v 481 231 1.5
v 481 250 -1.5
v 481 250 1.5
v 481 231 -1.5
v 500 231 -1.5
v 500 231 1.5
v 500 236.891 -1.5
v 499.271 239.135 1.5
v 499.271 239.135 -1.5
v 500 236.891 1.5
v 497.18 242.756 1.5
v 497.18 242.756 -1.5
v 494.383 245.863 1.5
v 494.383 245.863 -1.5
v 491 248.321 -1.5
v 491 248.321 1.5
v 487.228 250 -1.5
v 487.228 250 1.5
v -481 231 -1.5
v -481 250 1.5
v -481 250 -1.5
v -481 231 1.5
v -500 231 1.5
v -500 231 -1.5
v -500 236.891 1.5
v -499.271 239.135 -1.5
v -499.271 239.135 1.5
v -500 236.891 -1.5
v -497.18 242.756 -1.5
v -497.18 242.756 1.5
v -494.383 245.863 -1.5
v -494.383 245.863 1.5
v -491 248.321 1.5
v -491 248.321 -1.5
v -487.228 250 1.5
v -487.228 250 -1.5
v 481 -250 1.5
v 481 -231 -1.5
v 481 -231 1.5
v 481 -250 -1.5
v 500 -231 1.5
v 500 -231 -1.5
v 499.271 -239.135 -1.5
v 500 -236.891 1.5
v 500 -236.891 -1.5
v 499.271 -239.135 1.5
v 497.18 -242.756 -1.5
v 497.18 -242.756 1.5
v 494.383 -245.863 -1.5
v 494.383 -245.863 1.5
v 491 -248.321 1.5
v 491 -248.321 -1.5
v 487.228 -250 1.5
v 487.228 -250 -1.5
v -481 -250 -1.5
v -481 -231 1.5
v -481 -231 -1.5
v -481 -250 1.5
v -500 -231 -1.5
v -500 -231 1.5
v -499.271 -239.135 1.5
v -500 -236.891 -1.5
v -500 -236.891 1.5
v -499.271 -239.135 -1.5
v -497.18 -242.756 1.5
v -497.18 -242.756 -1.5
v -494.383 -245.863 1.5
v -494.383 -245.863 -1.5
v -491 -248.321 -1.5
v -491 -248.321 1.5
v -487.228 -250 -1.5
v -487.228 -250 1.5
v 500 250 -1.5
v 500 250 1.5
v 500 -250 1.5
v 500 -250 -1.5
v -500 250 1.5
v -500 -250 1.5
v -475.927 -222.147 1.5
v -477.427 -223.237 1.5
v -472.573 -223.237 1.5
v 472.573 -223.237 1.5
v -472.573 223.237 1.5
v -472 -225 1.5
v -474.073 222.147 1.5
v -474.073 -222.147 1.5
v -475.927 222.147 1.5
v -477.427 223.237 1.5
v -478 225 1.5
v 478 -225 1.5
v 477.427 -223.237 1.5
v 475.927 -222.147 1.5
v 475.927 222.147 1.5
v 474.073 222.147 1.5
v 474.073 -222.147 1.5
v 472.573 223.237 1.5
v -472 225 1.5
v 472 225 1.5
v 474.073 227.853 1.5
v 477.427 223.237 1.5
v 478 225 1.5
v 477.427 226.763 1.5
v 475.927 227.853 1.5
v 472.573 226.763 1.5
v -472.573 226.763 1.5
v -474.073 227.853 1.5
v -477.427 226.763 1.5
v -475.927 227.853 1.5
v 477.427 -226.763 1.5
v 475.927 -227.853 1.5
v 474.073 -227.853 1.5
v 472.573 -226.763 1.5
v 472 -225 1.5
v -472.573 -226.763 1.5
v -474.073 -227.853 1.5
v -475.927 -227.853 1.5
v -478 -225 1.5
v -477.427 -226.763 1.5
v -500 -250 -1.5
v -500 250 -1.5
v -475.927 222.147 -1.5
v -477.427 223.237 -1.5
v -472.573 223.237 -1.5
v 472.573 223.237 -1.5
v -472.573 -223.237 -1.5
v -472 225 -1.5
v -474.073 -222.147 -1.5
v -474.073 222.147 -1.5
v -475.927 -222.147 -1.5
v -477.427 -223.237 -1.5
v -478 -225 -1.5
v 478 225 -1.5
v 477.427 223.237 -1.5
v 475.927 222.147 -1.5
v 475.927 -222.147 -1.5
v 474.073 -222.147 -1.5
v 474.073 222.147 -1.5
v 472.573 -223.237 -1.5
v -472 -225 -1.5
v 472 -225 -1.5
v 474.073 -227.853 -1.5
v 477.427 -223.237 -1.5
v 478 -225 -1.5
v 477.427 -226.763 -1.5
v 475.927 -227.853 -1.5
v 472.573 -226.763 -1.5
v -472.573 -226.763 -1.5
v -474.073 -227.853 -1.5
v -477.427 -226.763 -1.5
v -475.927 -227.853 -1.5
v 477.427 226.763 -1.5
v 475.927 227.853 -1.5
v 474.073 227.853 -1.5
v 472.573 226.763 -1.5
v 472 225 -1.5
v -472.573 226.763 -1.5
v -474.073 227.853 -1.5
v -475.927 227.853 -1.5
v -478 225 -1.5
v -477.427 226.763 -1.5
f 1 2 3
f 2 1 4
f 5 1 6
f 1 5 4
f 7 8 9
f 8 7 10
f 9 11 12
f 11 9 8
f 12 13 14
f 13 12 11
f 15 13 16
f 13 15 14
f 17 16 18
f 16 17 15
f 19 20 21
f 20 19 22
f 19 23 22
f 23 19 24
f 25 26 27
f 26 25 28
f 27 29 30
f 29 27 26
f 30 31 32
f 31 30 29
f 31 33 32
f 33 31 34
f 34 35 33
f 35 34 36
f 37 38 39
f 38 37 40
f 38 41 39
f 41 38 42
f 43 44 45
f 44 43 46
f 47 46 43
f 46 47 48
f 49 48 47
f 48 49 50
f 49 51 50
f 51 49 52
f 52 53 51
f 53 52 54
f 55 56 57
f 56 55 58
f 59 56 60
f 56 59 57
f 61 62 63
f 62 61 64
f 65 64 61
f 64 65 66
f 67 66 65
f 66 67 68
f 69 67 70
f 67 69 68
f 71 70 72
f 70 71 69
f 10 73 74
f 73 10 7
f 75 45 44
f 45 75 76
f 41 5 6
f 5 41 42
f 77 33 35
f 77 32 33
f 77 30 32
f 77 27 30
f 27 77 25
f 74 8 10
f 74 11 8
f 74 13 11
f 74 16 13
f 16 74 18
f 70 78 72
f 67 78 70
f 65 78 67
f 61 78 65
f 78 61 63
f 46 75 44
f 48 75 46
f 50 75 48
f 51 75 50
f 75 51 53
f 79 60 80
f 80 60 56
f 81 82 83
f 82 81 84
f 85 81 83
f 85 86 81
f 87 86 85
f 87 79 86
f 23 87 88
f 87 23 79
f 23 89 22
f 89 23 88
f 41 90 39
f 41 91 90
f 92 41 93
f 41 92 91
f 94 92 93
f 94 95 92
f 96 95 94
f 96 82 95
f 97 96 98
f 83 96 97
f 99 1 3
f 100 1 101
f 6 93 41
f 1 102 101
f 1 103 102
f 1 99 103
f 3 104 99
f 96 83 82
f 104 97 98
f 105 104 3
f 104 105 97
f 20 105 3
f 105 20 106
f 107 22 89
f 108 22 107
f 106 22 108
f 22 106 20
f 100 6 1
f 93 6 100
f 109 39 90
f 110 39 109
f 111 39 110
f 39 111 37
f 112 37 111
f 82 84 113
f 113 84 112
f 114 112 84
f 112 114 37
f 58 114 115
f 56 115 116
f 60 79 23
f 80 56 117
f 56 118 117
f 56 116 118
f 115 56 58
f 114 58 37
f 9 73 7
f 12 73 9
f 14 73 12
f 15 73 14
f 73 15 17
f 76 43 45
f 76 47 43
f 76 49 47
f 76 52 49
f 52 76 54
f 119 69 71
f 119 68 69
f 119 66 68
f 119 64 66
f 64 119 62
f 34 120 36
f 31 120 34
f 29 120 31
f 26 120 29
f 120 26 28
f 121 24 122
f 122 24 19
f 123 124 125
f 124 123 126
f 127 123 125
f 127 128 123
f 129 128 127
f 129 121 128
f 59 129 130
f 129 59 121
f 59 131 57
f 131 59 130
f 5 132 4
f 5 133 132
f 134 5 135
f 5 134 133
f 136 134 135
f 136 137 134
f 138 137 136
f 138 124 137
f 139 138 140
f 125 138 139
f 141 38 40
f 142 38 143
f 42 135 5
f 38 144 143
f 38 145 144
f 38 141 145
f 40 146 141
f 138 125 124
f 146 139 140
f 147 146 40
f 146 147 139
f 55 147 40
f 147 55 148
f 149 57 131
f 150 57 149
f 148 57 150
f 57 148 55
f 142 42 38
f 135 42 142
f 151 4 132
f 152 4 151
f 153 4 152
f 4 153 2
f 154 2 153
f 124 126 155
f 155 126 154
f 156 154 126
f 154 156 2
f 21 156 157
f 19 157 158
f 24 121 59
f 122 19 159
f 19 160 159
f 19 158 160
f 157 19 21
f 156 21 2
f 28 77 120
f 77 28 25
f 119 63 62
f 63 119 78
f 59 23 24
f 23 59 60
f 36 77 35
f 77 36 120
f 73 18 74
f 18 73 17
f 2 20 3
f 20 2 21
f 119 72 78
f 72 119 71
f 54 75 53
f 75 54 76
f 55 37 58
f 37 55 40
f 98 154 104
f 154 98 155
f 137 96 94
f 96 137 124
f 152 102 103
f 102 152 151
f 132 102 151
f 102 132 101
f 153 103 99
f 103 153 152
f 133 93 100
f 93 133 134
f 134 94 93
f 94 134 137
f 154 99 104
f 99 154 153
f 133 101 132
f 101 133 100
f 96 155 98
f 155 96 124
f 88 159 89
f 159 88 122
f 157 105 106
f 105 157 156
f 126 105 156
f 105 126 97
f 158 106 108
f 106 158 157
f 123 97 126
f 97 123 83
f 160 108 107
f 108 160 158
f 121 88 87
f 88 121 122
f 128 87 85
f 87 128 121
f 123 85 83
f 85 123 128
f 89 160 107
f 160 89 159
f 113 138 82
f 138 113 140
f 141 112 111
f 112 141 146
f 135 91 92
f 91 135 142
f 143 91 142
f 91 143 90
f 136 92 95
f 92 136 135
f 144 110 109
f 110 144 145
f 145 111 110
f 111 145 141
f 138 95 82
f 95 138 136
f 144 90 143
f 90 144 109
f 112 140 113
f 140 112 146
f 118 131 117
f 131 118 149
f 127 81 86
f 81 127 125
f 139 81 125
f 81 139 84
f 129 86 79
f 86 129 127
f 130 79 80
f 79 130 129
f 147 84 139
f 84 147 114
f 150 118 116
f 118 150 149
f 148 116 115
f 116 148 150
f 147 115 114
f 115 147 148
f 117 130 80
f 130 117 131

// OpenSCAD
// Parameters
sheet_L = 1000; //[500:2000:1]
sheet_W = 500; //[250:1000:1]
sheet_T = 3; //[1.5:6:0.1]
corner_R = 20; //[5:40:1]
chamfer_C = 1; //[0.5:3:0.1]
hole_D = 6; //[3:12:0.5]
hole_edge_offset = 25; //[10:60:1]
hole_clear_Z = 2; //[1:10:0.5]
overlap = 1; //[0.5:2:0.1]

// Base Shapes
module sheet_panel() {
  translate([0, 0, 0])
    cube([sheet_L, sheet_W, sheet_T], center=true);
}

module rounded_corner_cut_cyl() {
  translate([0, 0, 0])
    cylinder(h=sheet_T + 2*overlap, r=corner_R, center=true);
}

module rounded_corner_cut_box() {
  translate([0, 0, 0])
    cube([corner_R, corner_R, sheet_T + 2*overlap], center=true);
}

module hole_cutter() {
  translate([0, 0, 0])
    cylinder(h=sheet_T + hole_clear_Z, r=hole_D/2, center=true);
}

module chamfer_cut_x() {
  translate([0, 0, 0])
    rotate([45, 0, 0])
      cube([sheet_L + 2*overlap, chamfer_C, chamfer_C], center=true);
}

module chamfer_cut_y() {
  translate([0, 0, 0])
    rotate([0, 45, 0])
      cube([chamfer_C, sheet_W + 2*overlap, chamfer_C], center=true);
}

// Operations
module rounded_corner_cut_NE() {
  intersection() {
    translate([sheet_L/2 - corner_R/2 + overlap, sheet_W/2 - corner_R/2 + overlap, 0])
      rounded_corner_cut_box();
    translate([sheet_L/2 - corner_R + overlap, sheet_W/2 - corner_R + overlap, 0])
      rounded_corner_cut_cyl();
  }
}

module rounded_corner_cut_NW() {
  mirror([1, 0, 0])
    rounded_corner_cut_NE();
}

module rounded_corner_cut_SE() {
  mirror([0, 1, 0])
    rounded_corner_cut_NE();
}

module rounded_corner_cut_SW() {
  mirror([0, 1, 0])
    rounded_corner_cut_NW();
}

module rounded_corners() {
  union() {
    rounded_corner_cut_NE();
    rounded_corner_cut_NW();
    rounded_corner_cut_SE();
    rounded_corner_cut_SW();
  }
}

module mounting_holes() {
  union() {
    translate([sheet_L/2 - hole_edge_offset, sheet_W/2 - hole_edge_offset, 0])
      hole_cutter();
    translate([-sheet_L/2 + hole_edge_offset, sheet_W/2 - hole_edge_offset, 0])
      hole_cutter();
    translate([sheet_L/2 - hole_edge_offset, -sheet_W/2 + hole_edge_offset, 0])
      hole_cutter();
    translate([-sheet_L/2 + hole_edge_offset, -sheet_W/2 + hole_edge_offset, 0])
      hole_cutter();
  }
}

module edge_chamfer() {
  union() {
    translate([0, sheet_W/2 - chamfer_C/2 + overlap, sheet_T/2 - chamfer_C/2 + overlap])
      chamfer_cut_x();
    translate([0, -sheet_W/2 + chamfer_C/2 - overlap, sheet_T/2 - chamfer_C/2 + overlap])
      chamfer_cut_x();
    translate([sheet_L/2 - chamfer_C/2 + overlap, 0, sheet_T/2 - chamfer_C/2 + overlap])
      chamfer_cut_y();
    translate([-sheet_L/2 + chamfer_C/2 - overlap, 0, sheet_T/2 - chamfer_C/2 + overlap])
      chamfer_cut_y();
  }
}

// Final Model
difference() {
  difference() {
    difference() {
      sheet_panel();
      rounded_corners();
    }
    mounting_holes();
  }
  edge_chamfer();
}
